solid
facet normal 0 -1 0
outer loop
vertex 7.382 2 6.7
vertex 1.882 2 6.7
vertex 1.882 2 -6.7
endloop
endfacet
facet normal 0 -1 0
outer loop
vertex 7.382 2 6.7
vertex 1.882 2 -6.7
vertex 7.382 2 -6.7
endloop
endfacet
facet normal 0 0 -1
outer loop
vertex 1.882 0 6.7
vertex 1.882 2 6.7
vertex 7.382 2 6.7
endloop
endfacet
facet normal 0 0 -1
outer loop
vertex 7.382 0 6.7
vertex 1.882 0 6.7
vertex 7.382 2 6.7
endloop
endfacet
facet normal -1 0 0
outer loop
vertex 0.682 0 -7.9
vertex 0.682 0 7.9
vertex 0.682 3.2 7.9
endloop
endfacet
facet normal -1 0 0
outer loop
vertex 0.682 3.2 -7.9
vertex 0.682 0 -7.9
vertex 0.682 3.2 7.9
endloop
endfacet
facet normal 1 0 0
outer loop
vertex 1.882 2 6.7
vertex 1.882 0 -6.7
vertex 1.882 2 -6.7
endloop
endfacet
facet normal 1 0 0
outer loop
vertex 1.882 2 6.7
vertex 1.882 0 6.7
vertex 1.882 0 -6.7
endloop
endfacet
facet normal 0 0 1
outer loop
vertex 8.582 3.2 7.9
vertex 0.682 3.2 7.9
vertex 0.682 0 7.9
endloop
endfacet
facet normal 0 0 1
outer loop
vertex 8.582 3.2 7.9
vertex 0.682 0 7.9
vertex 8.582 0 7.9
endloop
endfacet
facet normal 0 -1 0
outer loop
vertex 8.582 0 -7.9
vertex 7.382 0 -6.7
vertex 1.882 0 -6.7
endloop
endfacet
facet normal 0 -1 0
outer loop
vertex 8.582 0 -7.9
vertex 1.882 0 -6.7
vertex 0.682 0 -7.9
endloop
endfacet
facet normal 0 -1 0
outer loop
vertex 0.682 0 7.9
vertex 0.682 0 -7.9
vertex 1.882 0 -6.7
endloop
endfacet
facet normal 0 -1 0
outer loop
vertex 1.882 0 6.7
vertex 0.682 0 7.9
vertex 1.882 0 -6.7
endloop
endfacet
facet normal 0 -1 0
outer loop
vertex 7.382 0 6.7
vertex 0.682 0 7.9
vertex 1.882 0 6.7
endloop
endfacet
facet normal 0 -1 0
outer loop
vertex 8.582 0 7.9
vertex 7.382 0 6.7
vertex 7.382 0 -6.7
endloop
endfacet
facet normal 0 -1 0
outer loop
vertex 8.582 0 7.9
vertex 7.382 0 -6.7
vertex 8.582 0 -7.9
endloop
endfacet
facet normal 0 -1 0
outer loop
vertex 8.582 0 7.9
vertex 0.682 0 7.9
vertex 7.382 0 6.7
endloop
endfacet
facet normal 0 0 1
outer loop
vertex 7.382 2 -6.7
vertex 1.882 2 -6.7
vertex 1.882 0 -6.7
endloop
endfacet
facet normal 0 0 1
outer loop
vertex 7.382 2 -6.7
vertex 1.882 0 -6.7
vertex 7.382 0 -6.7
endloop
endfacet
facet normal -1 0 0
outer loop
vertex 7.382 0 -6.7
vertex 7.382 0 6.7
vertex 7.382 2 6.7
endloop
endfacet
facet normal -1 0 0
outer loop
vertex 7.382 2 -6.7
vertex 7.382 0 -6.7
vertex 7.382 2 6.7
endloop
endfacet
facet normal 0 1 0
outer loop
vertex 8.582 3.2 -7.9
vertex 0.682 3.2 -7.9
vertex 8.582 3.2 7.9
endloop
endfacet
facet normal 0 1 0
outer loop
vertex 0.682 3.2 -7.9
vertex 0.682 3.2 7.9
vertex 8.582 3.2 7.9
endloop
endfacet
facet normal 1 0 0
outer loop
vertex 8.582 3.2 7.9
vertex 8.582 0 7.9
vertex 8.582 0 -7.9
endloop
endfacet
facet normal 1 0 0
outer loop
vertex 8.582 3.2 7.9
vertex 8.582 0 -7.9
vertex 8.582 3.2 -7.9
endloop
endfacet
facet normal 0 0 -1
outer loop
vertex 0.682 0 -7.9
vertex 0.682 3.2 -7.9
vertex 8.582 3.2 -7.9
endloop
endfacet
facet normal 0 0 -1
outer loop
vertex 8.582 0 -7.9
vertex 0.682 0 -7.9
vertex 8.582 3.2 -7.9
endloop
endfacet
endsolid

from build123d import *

# Parameters (mm, degrees)
MAINBASESKETCH_W      = 7.9
MAINBASESKETCH_H      = 3.2
MAINBASEEXTRUDE_DEPTH = 7.9
MAINBASESHELL_T       = -1.2


with BuildPart() as part:
    # MainBaseSketch → MainBaseExtrude (new, symmetric)
    with BuildSketch(Plane.XY):
        with Locations((4.631967213, 1.6)):
            Rectangle(MAINBASESKETCH_W, MAINBASESKETCH_H)
    extrude(amount=MAINBASEEXTRUDE_DEPTH, both=True)

    # MainBaseShell
    mainbaseshell_openings = [part.faces().sort_by_distance(p)[0] for p in [
        (4.631967213, 0, 0),
    ]]
    offset(amount=MAINBASESHELL_T, openings=mainbaseshell_openings, kind=Kind.INTERSECTION)


solid = part.part
